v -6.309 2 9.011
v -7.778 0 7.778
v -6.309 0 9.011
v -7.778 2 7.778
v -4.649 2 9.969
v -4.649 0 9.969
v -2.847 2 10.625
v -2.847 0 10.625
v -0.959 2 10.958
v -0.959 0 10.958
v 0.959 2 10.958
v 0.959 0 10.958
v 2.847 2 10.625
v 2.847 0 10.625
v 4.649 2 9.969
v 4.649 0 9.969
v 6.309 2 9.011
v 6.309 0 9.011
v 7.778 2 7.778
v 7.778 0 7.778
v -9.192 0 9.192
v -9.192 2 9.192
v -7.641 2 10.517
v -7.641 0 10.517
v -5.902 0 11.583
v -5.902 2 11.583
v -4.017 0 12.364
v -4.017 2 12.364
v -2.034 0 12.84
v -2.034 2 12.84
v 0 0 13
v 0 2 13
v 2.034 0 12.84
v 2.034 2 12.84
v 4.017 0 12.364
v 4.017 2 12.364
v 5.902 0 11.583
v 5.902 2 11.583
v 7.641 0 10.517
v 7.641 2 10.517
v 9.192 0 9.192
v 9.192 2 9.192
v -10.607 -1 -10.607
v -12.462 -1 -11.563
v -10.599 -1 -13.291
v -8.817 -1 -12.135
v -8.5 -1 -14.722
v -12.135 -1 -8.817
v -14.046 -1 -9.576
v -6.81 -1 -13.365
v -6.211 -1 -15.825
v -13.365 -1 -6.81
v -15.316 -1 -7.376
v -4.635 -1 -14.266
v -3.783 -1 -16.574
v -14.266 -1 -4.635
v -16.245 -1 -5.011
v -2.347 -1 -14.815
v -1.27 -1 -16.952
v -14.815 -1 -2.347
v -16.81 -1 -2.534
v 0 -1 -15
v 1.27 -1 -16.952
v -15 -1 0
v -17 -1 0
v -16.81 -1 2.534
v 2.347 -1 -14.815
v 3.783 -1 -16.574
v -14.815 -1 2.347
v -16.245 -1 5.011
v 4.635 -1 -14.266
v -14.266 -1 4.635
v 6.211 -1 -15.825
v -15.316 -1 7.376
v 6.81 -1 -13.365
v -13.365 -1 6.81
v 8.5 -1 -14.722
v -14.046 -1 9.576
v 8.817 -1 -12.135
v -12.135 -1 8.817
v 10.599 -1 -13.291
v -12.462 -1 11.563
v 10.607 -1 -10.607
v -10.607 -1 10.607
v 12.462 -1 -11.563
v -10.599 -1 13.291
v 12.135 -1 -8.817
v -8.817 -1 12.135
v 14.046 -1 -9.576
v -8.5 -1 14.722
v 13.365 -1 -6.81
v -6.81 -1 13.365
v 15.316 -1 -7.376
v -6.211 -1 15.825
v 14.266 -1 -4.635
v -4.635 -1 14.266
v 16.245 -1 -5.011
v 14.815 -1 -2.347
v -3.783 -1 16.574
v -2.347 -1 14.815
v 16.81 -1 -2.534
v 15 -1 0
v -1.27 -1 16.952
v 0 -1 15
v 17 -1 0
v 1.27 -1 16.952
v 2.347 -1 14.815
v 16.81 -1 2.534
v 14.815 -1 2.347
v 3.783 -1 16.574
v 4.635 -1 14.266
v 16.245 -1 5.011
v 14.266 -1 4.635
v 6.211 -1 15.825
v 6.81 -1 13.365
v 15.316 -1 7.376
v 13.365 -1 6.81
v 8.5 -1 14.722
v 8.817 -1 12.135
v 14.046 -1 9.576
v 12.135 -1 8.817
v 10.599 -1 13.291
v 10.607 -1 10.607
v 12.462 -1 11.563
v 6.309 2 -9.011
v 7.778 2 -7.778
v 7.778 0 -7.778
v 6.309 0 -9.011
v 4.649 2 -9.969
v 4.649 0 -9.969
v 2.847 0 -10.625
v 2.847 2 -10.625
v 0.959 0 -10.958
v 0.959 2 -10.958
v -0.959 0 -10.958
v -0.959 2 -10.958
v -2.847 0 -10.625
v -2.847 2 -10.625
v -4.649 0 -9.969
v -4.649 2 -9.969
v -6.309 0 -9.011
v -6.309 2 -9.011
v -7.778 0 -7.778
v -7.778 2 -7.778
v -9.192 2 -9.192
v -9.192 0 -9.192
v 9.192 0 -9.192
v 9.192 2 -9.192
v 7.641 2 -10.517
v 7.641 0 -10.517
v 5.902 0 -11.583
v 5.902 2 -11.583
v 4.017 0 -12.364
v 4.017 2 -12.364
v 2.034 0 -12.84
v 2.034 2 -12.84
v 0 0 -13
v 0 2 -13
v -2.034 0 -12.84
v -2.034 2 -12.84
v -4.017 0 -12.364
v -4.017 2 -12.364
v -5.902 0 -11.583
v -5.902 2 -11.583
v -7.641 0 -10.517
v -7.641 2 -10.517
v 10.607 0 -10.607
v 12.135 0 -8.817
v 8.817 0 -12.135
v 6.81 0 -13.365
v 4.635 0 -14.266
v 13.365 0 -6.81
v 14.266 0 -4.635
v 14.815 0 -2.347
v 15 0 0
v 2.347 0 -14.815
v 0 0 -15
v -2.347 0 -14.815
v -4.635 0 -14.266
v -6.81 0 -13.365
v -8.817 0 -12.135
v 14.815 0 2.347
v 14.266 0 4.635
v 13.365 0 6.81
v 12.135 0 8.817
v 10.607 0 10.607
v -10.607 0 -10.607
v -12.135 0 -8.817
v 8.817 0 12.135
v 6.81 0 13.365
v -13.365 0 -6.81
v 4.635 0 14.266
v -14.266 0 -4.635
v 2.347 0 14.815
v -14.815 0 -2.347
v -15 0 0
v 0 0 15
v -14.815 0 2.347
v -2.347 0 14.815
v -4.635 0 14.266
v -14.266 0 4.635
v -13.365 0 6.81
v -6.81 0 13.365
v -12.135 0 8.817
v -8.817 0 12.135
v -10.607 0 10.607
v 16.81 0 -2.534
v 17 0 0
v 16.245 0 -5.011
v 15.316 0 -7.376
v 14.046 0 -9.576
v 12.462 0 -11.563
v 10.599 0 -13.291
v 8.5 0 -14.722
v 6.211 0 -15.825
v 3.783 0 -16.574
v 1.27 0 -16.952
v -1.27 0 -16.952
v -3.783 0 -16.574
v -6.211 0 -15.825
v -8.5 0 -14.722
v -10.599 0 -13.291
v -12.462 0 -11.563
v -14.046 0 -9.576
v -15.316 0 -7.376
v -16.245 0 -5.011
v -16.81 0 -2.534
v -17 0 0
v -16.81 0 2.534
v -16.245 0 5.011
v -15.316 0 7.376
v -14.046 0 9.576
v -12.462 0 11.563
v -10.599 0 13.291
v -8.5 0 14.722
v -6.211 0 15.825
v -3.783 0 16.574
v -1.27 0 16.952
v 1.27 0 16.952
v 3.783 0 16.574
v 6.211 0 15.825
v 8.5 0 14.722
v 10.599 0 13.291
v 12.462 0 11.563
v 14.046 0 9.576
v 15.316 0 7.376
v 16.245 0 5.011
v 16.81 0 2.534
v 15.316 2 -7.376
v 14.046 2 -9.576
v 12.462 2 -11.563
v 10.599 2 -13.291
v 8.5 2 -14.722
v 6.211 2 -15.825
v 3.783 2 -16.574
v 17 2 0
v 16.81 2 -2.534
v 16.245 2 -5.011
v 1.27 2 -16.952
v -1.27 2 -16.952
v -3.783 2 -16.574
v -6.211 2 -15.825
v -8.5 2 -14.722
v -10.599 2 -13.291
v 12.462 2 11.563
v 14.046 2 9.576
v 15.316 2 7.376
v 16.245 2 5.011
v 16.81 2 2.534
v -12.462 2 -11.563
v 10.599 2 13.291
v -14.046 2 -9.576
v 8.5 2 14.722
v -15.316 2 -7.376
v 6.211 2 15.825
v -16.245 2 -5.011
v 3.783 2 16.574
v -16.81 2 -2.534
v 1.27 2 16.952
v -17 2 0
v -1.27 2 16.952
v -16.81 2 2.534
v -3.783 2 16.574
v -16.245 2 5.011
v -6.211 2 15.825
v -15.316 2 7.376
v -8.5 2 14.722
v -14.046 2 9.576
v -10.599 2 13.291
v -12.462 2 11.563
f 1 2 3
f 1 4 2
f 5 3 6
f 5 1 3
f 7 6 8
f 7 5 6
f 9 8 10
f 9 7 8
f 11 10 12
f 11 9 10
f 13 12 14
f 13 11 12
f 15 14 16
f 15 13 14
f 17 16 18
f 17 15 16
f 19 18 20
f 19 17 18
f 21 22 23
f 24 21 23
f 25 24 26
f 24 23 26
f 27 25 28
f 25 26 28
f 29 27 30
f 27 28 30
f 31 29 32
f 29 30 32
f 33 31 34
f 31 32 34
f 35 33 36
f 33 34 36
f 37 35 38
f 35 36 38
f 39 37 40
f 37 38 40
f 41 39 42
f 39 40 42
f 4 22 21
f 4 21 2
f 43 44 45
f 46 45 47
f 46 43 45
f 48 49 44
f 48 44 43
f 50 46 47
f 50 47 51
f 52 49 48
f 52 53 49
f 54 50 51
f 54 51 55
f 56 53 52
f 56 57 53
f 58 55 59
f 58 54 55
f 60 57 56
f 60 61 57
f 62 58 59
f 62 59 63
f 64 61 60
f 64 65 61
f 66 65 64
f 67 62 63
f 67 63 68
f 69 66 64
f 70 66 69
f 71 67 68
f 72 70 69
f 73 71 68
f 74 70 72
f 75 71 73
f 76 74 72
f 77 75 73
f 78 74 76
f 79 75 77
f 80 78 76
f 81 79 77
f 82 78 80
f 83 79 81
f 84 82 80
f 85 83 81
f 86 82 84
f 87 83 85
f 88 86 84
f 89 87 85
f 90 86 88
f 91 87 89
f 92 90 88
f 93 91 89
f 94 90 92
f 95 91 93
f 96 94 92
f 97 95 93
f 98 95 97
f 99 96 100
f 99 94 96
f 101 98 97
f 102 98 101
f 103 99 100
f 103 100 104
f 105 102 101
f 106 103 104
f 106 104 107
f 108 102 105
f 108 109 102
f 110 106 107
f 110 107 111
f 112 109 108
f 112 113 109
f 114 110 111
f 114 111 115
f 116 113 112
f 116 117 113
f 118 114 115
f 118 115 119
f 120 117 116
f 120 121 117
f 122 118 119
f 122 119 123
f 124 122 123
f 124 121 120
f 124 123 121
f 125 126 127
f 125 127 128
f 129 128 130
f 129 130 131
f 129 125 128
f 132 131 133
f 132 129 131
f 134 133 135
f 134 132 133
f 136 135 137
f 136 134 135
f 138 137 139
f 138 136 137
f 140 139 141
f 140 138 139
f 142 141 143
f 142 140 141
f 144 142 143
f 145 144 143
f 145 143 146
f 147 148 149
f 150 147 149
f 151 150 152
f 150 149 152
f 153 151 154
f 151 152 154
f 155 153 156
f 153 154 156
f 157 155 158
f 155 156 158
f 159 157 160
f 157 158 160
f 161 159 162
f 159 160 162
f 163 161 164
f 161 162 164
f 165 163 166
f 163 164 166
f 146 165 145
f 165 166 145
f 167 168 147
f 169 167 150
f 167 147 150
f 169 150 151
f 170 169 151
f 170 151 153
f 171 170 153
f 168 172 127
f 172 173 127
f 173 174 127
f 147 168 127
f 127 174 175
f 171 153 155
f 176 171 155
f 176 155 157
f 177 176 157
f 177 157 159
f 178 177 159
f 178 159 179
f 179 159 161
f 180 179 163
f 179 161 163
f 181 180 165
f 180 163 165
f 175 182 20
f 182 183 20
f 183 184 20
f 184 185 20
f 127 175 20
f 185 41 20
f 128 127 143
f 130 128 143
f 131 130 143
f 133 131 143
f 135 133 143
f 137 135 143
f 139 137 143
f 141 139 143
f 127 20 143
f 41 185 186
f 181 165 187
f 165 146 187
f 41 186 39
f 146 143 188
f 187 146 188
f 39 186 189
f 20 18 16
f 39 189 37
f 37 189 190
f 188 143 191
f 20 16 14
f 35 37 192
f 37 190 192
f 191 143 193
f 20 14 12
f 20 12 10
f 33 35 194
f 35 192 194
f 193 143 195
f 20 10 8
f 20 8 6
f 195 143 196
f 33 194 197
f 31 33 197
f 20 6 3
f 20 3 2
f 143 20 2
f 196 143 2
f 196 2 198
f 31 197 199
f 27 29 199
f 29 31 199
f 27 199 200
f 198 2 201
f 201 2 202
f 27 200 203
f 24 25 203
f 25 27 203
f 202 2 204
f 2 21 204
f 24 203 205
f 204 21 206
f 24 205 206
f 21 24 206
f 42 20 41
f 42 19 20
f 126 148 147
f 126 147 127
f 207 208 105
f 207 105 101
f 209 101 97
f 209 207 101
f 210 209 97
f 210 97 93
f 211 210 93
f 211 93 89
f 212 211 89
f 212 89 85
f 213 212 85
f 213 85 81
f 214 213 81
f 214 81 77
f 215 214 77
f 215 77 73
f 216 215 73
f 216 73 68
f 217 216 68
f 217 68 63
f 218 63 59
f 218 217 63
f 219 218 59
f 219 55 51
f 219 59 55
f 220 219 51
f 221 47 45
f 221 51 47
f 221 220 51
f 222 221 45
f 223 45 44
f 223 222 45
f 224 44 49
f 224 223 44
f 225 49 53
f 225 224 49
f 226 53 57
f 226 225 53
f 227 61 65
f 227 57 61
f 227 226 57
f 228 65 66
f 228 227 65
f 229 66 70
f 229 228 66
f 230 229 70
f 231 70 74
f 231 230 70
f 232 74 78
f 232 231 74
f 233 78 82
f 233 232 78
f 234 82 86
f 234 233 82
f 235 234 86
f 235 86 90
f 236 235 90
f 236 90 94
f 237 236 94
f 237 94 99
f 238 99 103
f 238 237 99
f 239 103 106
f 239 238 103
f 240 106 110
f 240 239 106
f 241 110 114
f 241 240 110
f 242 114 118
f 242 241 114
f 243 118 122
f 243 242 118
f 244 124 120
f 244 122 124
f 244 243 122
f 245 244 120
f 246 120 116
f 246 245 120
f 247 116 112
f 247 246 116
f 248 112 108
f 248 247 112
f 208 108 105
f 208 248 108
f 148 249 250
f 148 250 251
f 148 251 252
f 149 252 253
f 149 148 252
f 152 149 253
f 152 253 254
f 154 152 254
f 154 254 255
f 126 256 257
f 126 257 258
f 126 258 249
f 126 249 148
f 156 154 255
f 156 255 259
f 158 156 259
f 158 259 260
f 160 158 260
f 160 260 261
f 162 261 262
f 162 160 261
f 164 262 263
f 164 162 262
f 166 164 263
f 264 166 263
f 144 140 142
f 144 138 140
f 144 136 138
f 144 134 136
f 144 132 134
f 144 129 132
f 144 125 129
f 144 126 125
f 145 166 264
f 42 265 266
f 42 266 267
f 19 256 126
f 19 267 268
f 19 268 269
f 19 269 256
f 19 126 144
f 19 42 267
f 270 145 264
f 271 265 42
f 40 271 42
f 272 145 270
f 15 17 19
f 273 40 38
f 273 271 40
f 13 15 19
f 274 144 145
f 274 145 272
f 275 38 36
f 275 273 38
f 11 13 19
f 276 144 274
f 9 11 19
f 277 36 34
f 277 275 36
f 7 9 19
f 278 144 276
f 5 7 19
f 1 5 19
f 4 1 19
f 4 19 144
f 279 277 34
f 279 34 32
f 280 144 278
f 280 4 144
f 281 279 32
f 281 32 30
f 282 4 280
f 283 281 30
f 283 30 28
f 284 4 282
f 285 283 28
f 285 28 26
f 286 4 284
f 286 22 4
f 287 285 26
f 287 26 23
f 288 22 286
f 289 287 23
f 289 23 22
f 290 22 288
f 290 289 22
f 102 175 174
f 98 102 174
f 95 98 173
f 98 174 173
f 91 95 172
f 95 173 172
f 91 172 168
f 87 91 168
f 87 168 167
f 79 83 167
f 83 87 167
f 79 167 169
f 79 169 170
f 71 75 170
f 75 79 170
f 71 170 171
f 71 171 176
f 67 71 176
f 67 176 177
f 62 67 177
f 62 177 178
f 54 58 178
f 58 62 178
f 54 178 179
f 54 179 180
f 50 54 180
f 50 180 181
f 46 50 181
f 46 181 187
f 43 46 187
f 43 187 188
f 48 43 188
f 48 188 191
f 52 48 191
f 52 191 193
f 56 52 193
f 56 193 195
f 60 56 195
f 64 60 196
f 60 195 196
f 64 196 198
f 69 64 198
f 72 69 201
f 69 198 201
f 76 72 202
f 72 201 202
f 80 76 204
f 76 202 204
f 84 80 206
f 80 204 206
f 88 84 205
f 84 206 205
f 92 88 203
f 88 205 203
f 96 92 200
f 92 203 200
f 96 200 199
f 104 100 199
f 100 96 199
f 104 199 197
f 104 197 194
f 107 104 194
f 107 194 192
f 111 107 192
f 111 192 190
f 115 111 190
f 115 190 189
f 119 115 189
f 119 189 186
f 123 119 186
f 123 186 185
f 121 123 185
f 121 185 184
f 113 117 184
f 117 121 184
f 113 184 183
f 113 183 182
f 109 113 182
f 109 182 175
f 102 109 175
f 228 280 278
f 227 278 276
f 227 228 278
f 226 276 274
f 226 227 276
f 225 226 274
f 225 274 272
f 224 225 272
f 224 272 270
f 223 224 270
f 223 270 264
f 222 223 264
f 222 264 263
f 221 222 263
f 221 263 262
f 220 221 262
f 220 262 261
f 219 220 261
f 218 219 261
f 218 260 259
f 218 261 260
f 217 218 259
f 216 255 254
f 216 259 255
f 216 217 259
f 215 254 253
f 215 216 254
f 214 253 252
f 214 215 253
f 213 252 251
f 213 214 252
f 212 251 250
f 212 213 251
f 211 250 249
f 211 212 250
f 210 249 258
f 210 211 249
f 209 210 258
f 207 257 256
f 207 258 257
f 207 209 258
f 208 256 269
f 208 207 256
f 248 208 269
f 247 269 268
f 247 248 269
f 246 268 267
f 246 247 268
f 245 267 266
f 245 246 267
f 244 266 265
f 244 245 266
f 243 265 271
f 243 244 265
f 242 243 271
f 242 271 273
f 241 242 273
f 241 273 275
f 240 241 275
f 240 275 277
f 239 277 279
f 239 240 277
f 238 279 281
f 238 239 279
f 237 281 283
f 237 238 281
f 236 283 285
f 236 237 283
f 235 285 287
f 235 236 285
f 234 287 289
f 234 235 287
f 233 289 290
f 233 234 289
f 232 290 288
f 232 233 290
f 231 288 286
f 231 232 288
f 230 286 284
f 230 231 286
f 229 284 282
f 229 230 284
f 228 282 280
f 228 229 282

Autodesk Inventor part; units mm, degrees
ref_plane "YZ Plane" through (0, 0, 0) normal (1, 0, 0) x (0, 1, 0)
ref_plane "XZ Plane" through (0, 0, 0) normal (0, 1, 0) x (-1, 0, 0)
ref_plane "XY Plane" through (0, 0, 0) normal (0, 0, 1) x (1, 0, 0)
sketch "Sketch1" plane through (0, 0, 0) normal (0, 1, 0) x (-1, 0, 0)
  circle A0 centre (0, 0) radius 17
  dimension "d0" = 34
extrude "Extrusion1" add sketch "Sketch1" along normal blind 2
sketch "Sketch2" plane through (0, 0, 0) normal (0, -1, 0) x (1, 0, 0)
  circle A0 centre (0, 0) radius 17 projected
  circle A1 centre (0, 0) radius 15
  dimension "d3" = 2
extrude "Extrusion2" add sketch "Sketch2" along normal blind 1
sketch "Sketch3" plane through (0, 2, 0) normal (0, 1, 0) x (1, 0, 0)
  circle A0 centre (0, 0) radius 17 projected
  arc A1 (-9.1924, -9.1924) -> (9.1924, -9.1924) centre (0, 0) ccw
  arc A2 (-7.7782, -7.7782) -> (7.7782, -7.7782) centre (0, 0) ccw
  line L0 (0, 0) -> (-9.1924, -9.1924) construction
  line L1 (0, 0) -> (9.1924, -9.1924) construction
  line L2 (-9.1924, -9.1924) -> (-7.7782, -7.7782)
  line L3 (7.7782, -7.7782) -> (9.1924, -9.1924)
  dimension "d6" = 4
  dimension "d7" = 2
extrude "Extrusion3" cut sketch "Sketch3" against normal through all contours L2 A2 L3 A1
mirror "Mirror1" about plane through (0, 0, 0) normal (0, 0, 1) of "Extrusion3"
properties part number "circularholder" material "PET Plastic"
